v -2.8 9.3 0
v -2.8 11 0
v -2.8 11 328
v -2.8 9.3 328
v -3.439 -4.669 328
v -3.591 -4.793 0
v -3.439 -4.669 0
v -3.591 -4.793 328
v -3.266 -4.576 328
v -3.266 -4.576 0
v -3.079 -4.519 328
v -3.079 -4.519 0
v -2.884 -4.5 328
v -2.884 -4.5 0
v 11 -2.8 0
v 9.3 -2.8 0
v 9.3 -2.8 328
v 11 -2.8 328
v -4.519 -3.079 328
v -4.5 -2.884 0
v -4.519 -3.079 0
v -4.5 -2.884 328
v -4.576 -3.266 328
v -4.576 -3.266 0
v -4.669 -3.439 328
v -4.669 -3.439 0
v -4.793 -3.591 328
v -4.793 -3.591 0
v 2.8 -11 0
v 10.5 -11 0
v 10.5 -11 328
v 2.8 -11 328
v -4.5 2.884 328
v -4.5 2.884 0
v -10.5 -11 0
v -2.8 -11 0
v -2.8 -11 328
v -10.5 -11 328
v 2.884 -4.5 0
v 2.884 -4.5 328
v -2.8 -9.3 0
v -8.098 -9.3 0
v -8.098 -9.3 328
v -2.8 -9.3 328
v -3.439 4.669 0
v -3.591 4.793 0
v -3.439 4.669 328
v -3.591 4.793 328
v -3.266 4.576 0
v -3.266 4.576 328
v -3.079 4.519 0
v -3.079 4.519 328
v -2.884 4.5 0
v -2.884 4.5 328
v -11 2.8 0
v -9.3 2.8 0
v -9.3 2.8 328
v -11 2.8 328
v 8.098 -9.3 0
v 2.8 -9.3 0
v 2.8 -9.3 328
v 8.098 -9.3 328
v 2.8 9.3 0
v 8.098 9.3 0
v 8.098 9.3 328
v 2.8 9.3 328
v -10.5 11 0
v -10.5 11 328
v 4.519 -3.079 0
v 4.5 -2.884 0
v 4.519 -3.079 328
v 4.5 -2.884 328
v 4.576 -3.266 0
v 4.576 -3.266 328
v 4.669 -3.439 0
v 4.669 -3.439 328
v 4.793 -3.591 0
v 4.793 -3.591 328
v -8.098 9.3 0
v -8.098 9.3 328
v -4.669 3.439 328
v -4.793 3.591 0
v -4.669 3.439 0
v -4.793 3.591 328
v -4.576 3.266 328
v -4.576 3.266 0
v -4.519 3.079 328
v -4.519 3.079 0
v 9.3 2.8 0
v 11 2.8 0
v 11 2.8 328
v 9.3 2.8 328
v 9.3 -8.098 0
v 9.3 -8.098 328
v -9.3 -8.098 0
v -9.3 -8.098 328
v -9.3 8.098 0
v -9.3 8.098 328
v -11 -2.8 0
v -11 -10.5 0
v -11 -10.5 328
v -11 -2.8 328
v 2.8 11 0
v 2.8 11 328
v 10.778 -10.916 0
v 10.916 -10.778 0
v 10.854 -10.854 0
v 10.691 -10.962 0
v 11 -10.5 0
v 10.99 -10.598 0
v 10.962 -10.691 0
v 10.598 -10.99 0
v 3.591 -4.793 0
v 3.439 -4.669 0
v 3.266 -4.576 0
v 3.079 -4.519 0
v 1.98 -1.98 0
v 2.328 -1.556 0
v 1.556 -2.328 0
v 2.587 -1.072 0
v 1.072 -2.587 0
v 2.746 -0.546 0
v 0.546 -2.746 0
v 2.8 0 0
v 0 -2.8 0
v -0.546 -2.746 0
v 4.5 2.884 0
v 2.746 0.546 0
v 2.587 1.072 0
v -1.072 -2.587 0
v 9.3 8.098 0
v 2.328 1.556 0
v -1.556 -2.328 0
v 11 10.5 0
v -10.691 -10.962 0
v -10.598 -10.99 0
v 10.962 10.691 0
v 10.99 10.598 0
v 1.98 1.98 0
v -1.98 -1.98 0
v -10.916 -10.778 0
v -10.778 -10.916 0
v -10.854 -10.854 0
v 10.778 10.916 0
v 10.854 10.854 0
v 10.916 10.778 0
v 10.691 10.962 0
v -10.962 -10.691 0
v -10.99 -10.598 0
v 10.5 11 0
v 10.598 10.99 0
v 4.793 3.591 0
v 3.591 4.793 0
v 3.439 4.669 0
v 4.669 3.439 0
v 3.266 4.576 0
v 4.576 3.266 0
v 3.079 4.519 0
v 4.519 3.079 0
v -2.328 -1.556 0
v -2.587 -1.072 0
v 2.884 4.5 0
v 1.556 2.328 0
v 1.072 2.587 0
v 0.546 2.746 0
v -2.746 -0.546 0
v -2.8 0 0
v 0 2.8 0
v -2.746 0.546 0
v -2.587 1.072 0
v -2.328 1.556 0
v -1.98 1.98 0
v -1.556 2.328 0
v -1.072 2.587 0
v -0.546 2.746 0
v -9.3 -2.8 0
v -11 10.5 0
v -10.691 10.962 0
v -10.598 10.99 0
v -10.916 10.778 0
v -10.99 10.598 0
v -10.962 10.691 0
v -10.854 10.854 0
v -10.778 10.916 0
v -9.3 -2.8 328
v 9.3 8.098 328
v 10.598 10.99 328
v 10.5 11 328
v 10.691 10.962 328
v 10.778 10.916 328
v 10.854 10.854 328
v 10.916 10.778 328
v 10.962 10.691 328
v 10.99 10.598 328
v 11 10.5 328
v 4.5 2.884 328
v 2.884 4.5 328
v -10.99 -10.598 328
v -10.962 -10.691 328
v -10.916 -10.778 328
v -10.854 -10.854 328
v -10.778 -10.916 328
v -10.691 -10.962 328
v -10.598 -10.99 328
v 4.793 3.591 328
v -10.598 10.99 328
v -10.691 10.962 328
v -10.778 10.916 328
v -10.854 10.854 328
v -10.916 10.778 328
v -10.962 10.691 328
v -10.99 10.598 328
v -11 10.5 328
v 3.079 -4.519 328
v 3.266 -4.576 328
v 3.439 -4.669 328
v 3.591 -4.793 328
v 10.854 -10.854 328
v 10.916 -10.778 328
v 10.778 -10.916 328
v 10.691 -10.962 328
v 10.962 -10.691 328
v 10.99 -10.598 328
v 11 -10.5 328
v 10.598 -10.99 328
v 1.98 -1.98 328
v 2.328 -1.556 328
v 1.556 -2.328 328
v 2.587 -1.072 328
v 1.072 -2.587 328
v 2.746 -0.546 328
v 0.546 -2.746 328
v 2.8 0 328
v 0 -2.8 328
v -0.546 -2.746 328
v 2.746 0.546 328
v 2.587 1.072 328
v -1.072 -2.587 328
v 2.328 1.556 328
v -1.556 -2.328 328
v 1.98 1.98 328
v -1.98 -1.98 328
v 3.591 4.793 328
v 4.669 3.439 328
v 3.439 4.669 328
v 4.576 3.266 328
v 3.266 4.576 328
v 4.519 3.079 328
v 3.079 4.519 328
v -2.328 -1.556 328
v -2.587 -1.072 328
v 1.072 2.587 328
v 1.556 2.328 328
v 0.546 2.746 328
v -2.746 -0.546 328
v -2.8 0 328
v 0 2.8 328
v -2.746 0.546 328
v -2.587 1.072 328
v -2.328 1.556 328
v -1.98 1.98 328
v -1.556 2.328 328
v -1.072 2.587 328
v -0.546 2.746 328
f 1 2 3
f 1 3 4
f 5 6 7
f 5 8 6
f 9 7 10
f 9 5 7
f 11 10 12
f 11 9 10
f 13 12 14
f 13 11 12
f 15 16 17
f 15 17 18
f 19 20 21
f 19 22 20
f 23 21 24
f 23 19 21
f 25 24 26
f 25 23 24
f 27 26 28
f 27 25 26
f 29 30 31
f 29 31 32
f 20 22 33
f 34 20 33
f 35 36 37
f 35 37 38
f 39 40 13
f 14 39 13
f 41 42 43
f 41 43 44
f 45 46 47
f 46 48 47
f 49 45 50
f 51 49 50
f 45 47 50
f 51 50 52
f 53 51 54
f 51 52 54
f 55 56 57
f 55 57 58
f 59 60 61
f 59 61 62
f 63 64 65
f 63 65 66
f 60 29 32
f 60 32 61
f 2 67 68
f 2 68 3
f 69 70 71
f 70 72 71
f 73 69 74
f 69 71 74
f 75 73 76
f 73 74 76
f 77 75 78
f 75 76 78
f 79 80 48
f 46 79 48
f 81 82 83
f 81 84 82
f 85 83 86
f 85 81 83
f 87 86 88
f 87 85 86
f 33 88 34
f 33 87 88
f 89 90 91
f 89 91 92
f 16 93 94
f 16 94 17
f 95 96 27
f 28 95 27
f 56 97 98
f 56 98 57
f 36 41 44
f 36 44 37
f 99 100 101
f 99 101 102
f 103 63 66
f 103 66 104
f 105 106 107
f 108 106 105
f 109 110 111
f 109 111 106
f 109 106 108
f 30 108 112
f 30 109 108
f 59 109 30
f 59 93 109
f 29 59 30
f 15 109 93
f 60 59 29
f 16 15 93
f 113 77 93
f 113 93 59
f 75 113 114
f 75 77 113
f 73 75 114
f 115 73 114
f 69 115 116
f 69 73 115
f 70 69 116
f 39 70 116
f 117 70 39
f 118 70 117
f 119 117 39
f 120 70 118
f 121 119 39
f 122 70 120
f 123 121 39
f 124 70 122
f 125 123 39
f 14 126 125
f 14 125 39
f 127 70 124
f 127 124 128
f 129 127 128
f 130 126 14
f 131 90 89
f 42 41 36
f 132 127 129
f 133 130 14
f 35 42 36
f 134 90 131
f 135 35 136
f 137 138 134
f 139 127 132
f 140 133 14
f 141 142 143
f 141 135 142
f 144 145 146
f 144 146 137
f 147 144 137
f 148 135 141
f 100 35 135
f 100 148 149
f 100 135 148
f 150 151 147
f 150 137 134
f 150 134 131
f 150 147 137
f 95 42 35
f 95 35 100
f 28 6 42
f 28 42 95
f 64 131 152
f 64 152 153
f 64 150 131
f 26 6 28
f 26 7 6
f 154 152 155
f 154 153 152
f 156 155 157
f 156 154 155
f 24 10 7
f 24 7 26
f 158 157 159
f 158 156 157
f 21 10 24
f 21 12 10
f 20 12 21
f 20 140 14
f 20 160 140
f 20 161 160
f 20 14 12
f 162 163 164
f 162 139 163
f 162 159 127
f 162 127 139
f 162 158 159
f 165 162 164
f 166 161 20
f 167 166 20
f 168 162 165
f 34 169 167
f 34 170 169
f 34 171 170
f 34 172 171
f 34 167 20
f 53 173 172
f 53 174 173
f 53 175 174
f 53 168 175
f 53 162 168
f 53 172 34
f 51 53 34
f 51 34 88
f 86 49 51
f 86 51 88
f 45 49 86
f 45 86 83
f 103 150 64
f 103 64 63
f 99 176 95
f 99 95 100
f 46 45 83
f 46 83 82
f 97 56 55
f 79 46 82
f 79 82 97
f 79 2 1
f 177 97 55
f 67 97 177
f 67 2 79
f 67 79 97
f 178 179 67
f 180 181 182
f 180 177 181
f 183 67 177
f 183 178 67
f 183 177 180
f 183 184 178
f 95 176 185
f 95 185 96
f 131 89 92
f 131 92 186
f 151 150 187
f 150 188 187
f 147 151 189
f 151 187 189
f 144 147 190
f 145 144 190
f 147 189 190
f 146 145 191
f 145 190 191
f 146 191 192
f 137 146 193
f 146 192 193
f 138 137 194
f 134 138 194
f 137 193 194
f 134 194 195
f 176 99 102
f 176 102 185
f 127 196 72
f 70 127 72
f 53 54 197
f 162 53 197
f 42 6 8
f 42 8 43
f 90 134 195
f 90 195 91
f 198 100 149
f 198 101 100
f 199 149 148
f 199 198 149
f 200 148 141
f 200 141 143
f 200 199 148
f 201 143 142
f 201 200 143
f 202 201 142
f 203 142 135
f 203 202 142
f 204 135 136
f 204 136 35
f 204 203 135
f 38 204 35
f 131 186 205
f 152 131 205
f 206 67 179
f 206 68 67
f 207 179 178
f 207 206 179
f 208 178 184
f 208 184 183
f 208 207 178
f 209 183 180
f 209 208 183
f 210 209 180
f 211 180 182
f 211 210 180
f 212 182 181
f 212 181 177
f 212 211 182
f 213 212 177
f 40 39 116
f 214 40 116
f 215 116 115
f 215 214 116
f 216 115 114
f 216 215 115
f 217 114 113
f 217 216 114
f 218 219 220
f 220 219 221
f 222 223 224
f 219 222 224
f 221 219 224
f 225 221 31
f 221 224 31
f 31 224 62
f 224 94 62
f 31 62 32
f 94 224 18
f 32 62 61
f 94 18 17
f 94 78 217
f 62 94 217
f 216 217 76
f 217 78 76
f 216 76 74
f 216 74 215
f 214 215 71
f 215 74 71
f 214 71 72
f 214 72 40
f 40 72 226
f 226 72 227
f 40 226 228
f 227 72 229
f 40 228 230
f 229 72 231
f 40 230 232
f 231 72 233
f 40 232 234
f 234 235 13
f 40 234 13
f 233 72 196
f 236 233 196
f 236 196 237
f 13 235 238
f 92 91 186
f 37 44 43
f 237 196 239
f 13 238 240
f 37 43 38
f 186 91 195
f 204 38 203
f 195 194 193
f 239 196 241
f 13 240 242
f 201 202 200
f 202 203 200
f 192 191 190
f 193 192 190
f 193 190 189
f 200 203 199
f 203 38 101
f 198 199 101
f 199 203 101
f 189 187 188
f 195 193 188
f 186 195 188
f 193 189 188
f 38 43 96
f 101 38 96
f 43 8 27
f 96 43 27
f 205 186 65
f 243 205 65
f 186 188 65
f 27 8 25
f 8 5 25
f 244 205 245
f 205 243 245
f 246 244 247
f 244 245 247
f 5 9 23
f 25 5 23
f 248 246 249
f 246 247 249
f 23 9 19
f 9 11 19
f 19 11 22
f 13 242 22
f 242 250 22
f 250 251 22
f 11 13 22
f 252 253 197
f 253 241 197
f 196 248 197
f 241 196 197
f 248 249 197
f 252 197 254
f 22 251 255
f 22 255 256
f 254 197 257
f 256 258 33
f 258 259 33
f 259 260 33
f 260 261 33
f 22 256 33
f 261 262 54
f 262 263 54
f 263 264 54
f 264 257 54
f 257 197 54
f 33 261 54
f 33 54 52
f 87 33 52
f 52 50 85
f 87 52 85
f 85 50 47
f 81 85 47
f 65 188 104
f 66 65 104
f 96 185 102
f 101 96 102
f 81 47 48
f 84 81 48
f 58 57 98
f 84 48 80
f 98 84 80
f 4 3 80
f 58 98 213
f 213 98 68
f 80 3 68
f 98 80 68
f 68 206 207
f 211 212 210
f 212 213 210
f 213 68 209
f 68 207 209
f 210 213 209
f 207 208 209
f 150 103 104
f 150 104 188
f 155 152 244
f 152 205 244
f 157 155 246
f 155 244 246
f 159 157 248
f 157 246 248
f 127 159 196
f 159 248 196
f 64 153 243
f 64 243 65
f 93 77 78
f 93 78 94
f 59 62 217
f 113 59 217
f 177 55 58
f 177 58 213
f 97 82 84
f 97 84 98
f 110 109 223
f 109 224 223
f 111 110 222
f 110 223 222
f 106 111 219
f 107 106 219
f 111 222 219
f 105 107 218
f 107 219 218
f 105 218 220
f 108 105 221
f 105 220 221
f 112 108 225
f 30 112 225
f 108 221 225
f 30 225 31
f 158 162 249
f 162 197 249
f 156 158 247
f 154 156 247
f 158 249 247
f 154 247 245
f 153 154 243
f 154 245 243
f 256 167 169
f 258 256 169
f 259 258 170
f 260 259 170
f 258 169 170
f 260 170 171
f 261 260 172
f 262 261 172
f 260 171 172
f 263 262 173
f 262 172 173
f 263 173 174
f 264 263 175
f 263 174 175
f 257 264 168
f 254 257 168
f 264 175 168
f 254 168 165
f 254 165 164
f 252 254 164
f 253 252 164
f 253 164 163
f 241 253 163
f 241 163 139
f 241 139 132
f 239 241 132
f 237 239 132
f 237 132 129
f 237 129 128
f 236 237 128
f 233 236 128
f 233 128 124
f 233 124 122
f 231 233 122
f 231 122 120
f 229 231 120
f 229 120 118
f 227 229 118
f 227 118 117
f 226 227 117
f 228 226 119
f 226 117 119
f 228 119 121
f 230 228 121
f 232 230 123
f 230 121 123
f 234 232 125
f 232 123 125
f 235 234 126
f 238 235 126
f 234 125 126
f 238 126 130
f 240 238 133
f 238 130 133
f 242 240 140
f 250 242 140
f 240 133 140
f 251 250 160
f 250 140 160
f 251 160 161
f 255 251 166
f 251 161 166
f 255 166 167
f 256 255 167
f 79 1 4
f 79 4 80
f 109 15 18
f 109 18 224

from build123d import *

# Parameters (mm, degrees)
EXTRUSION1_DEPTH        = 328
ESQUISSE2_R             = 2.8
ENL_V_MAT_EXTRU_1_DEPTH = 329
CONG_1_R                = 0.5
CONG_2_R                = 1


with BuildPart() as part:
    # Esquisse1 → Extrusion1 (new body)
    with BuildSketch(Plane.XY):
        Polygon((-2.8, 11), (-2.8, 9.3), (-8.097918472, 9.3), (-3.297918472, 4.5), (3.297918472, 4.5), (8.097918472, 9.3), (2.8, 9.3), (2.8, 11), (11, 11), (11, 2.8), (9.3, 2.8), (9.3, 8.097918472), (4.5, 3.297918472), (4.5, -3.297918472), (9.3, -8.097918472), (9.3, -2.8), (11, -2.8), (11, -11), (2.8, -11), (2.8, -9.3), (8.097918472, -9.3), (3.297918472, -4.5), (-3.297918472, -4.5), (-8.097918472, -9.3), (-2.8, -9.3), (-2.8, -11), (-11, -11), (-11, -2.8), (-9.3, -2.8), (-9.3, -8.097918472), (-4.5, -3.297918472), (-4.5, 3.297918472), (-9.3, 8.097918472), (-9.3, 2.8), (-11, 2.8), (-11, 11), align=None)
    extrude(amount=EXTRUSION1_DEPTH)

    # Esquisse2 → Enlèv. mat.-Extru.1 (cut, through all)
    with BuildSketch(Plane(origin=(0, 0, 0), x_dir=(-1, 0, 0), z_dir=(0, 0, -1))):
        Circle(ESQUISSE2_R)
    extrude(amount=-ENL_V_MAT_EXTRU_1_DEPTH, mode=Mode.SUBTRACT)

    # Congé1
    cong_1_edges = [part.edges().sort_by_distance(p)[0] for p in [
        (-11, 11, 164),
        (11, 11, 164),
        (11, -11, 164),
        (-11, -11, 164),
    ]]
    fillet(cong_1_edges, radius=CONG_1_R)

    # Congé2
    cong_2_edges = [part.edges().sort_by_distance(p)[0] for p in [
        (-4.5, -3.297918472, 164),
        (-4.5, 3.297918472, 164),
        (-3.297918472, 4.5, 164),
        (3.297918472, 4.5, 164),
        (4.5, 3.297918472, 164),
        (4.5, -3.297918472, 164),
        (3.297918472, -4.5, 164),
        (-3.297918472, -4.5, 164),
    ]]
    fillet(cong_2_edges, radius=CONG_2_R)


solid = part.part
